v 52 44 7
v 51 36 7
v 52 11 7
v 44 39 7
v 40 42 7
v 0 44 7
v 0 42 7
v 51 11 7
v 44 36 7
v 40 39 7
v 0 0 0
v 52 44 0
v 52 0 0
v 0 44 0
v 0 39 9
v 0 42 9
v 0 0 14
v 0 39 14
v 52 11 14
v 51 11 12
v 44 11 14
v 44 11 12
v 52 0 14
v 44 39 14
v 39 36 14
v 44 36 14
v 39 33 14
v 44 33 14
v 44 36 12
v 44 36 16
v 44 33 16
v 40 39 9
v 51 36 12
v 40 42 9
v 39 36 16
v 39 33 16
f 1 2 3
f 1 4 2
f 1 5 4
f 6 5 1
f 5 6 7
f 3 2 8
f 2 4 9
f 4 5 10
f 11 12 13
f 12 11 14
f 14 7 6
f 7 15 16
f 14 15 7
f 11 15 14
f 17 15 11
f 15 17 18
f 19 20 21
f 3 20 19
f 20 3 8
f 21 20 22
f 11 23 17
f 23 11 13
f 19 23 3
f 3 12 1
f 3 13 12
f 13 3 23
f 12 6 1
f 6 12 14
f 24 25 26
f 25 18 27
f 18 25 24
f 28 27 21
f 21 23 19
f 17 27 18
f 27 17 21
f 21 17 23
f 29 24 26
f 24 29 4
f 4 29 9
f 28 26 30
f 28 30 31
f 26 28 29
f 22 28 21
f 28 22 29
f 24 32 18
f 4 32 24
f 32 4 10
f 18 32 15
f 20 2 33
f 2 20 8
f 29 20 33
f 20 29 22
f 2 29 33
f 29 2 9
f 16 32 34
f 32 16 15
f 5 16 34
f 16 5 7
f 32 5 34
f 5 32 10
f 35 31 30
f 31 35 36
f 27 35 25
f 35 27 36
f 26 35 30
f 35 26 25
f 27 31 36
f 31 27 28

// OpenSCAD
translate([6.5, 5.5, 3.5]) color([0.29252642189785794, 0.9007258804640697, 0.14067978971908934]) cube([13, 11, 7], center=true);
translate([19.5, 5.5, 3.5]) color([0.5728503338092871, 0.1912043400515635, 0.43401891336511733]) cube([13, 11, 7], center=true);
translate([32.5, 5.5, 3.5]) color([0.7163457448050065, 0.3841301513333275, 0.33069552050314754]) cube([13, 11, 7], center=true);
translate([45.5, 5.5, 3.5]) color([0.6480049557775331, 0.6874717059379091, 0.14801928734251768]) cube([13, 11, 7], center=true);
translate([6.5, 16.5, 3.5]) color([0.93323205939552, 0.14750072005511716, 0.31607169754224296]) cube([13, 11, 7], center=true);
translate([19.5, 16.5, 3.5]) color([0.2088660889148145, 0.1868244368145192, 0.3491672112743387]) cube([13, 11, 7], center=true);
translate([32.5, 16.5, 3.5]) color([0.9834841816788549, 0.427290207198605, 0.49195852420878716]) cube([13, 11, 7], center=true);
translate([45.5, 16.5, 3.5]) color([0.7297831417632067, 0.7955834433152874, 0.43927203819181504]) cube([13, 11, 7], center=true);
translate([6.5, 27.5, 3.5]) color([0.2042687131951023, 0.709997013582239, 0.9058221085991531]) cube([13, 11, 7], center=true);
translate([19.5, 27.5, 3.5]) color([0.03327924187503195, 0.6331757983912308, 0.8710093735661795]) cube([13, 11, 7], center=true);
translate([32.5, 27.5, 3.5]) color([0.3636101637556439, 0.7431628081058981, 0.6774926049513658]) cube([13, 11, 7], center=true);
translate([45.5, 27.5, 3.5]) color([0.23306417175218364, 0.2975271762349214, 0.0866296567389645]) cube([13, 11, 7], center=true);
translate([6.5, 38.5, 3.5]) color([0.8688435220131177, 0.7514921149941085, 0.7714305883456576]) cube([13, 11, 7], center=true);
translate([19.5, 38.5, 3.5]) color([0.8829516943772963, 0.4114323292545551, 0.05394001775890156]) cube([13, 11, 7], center=true);
translate([32.5, 38.5, 3.5]) color([0.696805048854085, 0.6656296547984208, 0.6485122289860075]) cube([13, 11, 7], center=true);
translate([45.5, 38.5, 3.5]) color([0.5471816206705559, 0.7344166333532061, 0.4306045068871984]) cube([13, 11, 7], center=true);
translate([6.5, 5.5, 10.5]) color([0.45460236437769275, 0.25475221651879554, 0.47565246533915095]) cube([13, 11, 7], center=true);
translate([19.5, 5.5, 10.5]) color([0.3371942584654095, 0.04223511400675217, 0.05255331220371673]) cube([13, 11, 7], center=true);
translate([32.5, 5.5, 10.5]) color([0.34980223330761895, 0.2898096938030986, 0.007130057665757694]) cube([13, 11, 7], center=true);
translate([45.5, 5.5, 10.5]) color([0.06369015415518986, 0.42774457246440645, 0.22216650821772055]) cube([13, 11, 7], center=true);
translate([5.5, 14.5, 10.5]) color([0.6086379170158094, 0.557768500755667, 0.22097295115667703]) cube([11, 7, 7], center=true);
translate([16.5, 14.5, 10.5]) color([0.19284823789822858, 0.6083188139076446, 0.606354511401297]) cube([11, 7, 7], center=true);
translate([27.5, 14.5, 10.5]) color([0.08562053587131313, 0.31903016062772993, 0.53590115499306]) cube([11, 7, 7], center=true);
translate([38.5, 14.5, 10.5]) color([0.8934753784920533, 0.25549985489866966, 0.5219903070058861]) cube([11, 7, 7], center=true);
translate([5.5, 21.5, 10.5]) color([0.1901317713313112, 0.08011594570868696, 0.8699478397109702]) cube([11, 7, 7], center=true);
translate([16.5, 21.5, 10.5]) color([0.3457472114844995, 0.837290862214726, 0.25127706432840136]) cube([11, 7, 7], center=true);
translate([27.5, 21.5, 10.5]) color([0.7290260027021367, 0.3013213449137814, 0.5169005458056509]) cube([11, 7, 7], center=true);
translate([38.5, 21.5, 10.5]) color([0.38467176448284957, 0.4820846642847386, 0.8719757028853922]) cube([11, 7, 7], center=true);
translate([5.5, 28.5, 10.5]) color([0.2399620044566907, 0.3058147052987177, 0.5519737755681405]) cube([11, 7, 7], center=true);
translate([16.5, 28.5, 10.5]) color([0.009208459116004764, 0.4953005367860557, 0.43819859659275806]) cube([11, 7, 7], center=true);
translate([27.5, 28.5, 10.5]) color([0.9171481192782721, 0.41212019308576986, 0.49358197644734136]) cube([11, 7, 7], center=true);
translate([38.5, 28.5, 10.5]) color([0.44010860560926524, 0.0856157398333921, 0.2411443971002879]) cube([11, 7, 7], center=true);
translate([5.5, 35.5, 10.5]) color([0.8262650576639278, 0.15379567752788093, 0.8842528530898255]) cube([11, 7, 7], center=true);
translate([16.5, 35.5, 10.5]) color([0.2134665283608419, 0.6127566924478359, 0.818008657000479]) cube([11, 7, 7], center=true);
translate([27.5, 35.5, 10.5]) color([0.5590112191053322, 0.8866043301622452, 0.39447102725022787]) cube([11, 7, 7], center=true);
translate([38.5, 35.5, 10.5]) color([0.9589163376419946, 0.24972819156954773, 0.22005049979750413]) cube([11, 7, 7], center=true);
translate([47.5, 13.5, 9.5]) color([0.8404590105346786, 0.2789960200671917, 0.35210354864297055]) cube([7, 5, 5], center=true);
translate([47.5, 18.5, 9.5]) color([0.9946691500756418, 0.10728537706325991, 0.8996256313138141]) cube([7, 5, 5], center=true);
translate([47.5, 23.5, 9.5]) color([0.6100819970747507, 0.7890377134172993, 0.7110679469752405]) cube([7, 5, 5], center=true);
translate([47.5, 28.5, 9.5]) color([0.7774643558396669, 0.5140354678382717, 0.46207744282607]) cube([7, 5, 5], center=true);
translate([47.5, 33.5, 9.5]) color([0.6343562920465169, 0.27254621857246664, 0.016558424522952975]) cube([7, 5, 5], center=true);
translate([2.5, 40.5, 8.0]) color([0.6148716567717017, 0.7119066573597548, 0.17257617960039529]) cube([5, 3, 2], center=true);
translate([7.5, 40.5, 8.0]) color([0.41465974039415787, 0.21806470516739018, 0.8797884787327306]) cube([5, 3, 2], center=true);
translate([12.5, 40.5, 8.0]) color([0.9971497033508181, 0.006439244314443648, 0.5355241113549698]) cube([5, 3, 2], center=true);
translate([17.5, 40.5, 8.0]) color([0.428269623660265, 0.0497703561320445, 0.3846945959716809]) cube([5, 3, 2], center=true);
translate([22.5, 40.5, 8.0]) color([0.27248481749180187, 0.9711494351721061, 0.5646669518865992]) cube([5, 3, 2], center=true);
translate([27.5, 40.5, 8.0]) color([0.22956269737245216, 0.7165492601952248, 0.5466375027642284]) cube([5, 3, 2], center=true);
translate([32.5, 40.5, 8.0]) color([0.2821670936164109, 0.7398695784196249, 0.9015687423954613]) cube([5, 3, 2], center=true);
translate([37.5, 40.5, 8.0]) color([0.06478718309218656, 0.3075184499818515, 0.32730937178137276]) cube([5, 3, 2], center=true);
translate([41.5, 34.5, 15.0]) color([0.373196919474838, 0.48026967262350795, 0.5820603979481933]) cube([5, 3, 2], center=true);
